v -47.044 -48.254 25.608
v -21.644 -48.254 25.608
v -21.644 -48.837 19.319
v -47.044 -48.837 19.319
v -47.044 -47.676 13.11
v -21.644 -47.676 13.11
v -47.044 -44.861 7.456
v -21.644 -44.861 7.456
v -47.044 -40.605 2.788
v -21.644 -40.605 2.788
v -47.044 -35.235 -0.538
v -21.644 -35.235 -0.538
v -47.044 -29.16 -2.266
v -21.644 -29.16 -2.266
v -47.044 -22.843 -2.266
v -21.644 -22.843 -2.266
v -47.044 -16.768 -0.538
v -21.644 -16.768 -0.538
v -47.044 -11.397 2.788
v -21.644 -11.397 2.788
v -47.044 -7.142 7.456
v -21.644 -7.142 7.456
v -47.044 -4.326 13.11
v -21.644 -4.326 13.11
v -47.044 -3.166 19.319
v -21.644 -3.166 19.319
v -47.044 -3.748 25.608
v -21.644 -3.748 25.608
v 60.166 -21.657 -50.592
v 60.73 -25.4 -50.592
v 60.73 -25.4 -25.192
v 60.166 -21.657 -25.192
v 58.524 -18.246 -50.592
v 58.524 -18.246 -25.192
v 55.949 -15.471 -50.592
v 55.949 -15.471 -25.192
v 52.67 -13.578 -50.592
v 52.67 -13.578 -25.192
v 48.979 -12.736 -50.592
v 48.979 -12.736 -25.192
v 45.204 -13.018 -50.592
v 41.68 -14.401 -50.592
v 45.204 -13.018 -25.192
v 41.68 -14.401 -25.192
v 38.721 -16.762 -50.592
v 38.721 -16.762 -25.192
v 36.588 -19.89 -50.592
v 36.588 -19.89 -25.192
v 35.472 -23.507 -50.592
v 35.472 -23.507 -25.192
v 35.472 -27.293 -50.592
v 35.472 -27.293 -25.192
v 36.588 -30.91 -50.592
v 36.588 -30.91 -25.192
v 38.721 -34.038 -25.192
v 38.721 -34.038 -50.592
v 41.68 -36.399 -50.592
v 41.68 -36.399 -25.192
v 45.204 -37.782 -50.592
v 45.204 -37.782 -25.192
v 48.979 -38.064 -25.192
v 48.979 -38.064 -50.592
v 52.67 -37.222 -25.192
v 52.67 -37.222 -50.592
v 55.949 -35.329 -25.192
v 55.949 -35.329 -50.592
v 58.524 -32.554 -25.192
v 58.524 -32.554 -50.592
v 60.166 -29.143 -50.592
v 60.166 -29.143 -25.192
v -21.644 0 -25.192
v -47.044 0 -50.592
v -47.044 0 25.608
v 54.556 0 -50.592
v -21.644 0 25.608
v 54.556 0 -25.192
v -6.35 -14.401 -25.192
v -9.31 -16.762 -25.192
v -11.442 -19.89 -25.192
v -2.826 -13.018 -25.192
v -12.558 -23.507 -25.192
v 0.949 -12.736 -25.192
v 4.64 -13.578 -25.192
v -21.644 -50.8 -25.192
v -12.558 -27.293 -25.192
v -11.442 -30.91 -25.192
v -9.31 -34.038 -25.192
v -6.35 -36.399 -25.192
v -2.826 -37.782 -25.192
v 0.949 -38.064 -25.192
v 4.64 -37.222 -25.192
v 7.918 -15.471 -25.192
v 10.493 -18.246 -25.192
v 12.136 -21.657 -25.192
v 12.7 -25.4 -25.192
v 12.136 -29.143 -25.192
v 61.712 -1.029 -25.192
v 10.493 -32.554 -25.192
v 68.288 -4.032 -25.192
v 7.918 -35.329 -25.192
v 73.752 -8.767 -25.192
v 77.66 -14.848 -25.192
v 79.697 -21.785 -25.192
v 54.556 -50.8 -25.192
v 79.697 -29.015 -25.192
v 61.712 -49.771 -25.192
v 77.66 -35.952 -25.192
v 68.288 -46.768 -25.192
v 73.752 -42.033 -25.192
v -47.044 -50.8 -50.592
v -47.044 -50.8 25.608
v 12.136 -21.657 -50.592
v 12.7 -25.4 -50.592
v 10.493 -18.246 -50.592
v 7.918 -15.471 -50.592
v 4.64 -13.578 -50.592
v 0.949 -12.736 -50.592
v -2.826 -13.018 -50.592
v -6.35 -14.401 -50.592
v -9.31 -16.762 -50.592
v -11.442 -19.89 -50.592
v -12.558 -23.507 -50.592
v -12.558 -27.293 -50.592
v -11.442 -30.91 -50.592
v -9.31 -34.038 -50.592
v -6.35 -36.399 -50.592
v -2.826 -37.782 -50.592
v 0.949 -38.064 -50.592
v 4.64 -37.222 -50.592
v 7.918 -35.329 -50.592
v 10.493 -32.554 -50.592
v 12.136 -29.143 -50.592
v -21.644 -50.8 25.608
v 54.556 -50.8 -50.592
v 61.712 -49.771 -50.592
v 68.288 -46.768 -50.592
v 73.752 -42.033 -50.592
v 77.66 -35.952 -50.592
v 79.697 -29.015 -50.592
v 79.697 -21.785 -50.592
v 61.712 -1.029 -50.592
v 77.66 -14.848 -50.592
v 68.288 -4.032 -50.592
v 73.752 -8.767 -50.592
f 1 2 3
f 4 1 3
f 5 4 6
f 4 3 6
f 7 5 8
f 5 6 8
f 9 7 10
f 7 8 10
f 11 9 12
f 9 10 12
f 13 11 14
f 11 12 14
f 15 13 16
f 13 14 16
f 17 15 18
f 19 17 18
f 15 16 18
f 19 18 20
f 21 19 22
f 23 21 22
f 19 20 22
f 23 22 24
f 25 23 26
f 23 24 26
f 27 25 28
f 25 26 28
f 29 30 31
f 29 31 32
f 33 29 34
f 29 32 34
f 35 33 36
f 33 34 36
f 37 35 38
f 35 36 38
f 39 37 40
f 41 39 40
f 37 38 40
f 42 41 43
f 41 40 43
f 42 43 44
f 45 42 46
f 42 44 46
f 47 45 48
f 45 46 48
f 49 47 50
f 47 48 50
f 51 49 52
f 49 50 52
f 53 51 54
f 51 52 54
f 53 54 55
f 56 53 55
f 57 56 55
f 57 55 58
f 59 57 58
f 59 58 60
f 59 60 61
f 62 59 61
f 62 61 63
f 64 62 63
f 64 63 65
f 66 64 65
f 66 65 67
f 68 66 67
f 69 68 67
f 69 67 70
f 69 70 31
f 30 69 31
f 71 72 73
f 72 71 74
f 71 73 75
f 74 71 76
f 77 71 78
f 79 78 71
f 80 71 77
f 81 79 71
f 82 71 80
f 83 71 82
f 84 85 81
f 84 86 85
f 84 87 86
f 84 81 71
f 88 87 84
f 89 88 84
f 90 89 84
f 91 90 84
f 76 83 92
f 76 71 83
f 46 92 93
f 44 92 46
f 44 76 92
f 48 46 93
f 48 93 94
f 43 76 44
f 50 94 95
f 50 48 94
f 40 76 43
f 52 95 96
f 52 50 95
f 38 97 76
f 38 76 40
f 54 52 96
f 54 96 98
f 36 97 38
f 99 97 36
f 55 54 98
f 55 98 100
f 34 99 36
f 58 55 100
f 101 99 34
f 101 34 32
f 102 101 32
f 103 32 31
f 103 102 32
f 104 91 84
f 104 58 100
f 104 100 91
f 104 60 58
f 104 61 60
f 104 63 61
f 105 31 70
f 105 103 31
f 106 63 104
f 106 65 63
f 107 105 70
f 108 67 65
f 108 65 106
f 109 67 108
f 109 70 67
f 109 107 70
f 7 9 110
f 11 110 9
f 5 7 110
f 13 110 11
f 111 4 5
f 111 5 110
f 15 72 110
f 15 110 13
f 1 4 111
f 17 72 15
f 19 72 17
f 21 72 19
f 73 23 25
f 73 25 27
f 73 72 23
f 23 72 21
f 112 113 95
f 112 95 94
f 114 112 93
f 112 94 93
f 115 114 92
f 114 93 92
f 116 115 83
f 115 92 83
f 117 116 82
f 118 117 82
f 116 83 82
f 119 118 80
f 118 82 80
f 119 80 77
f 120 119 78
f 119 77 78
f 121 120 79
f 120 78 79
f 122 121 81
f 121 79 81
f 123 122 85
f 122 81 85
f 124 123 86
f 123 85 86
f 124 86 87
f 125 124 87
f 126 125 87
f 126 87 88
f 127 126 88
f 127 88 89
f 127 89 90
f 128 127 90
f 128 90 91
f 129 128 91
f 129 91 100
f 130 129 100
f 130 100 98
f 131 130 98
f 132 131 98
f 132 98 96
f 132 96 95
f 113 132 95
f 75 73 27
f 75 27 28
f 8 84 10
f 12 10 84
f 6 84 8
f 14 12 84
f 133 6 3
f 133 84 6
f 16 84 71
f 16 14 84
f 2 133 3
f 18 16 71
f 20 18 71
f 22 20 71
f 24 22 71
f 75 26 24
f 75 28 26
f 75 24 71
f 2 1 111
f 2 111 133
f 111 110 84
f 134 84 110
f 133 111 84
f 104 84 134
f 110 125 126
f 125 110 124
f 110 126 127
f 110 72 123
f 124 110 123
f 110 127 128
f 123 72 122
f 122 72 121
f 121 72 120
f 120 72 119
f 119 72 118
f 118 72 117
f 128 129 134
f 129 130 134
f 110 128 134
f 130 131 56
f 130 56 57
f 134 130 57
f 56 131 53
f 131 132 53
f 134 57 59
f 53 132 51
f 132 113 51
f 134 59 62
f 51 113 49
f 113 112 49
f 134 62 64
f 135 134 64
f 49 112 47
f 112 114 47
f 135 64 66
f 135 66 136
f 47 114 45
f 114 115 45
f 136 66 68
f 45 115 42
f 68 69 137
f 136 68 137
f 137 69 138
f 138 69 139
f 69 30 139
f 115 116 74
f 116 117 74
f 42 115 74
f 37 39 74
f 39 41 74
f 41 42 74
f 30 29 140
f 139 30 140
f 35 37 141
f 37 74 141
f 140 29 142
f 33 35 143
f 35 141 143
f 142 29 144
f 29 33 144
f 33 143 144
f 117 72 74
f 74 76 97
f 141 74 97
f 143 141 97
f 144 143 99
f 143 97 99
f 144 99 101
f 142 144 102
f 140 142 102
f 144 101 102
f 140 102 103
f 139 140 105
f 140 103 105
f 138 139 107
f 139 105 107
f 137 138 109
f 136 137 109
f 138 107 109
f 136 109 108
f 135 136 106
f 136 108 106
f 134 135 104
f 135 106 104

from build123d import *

# Parameters (mm, degrees)
F0_W     = 101.6
F0_H     = 76.2
F1_DEPTH = 50.8
F2_W     = 76.2
F2_H     = 50.8
F3_DEPTH = 50.8
F4_W     = 25.4
F4_H     = 25.4
F6_R     = 12.7
F7_DEPTH = 101.6
F9_DEPTH = 101.6


with BuildPart() as f1:
    # F0 (on Front) → F1 (new body)
    with BuildSketch(Plane.XZ):
        with Locations((3.755716607, -12.4916662514)):
            Rectangle(F0_W, F0_H)
    extrude(amount=F1_DEPTH)

    # F2 (on face) → F3 (cut)
    with BuildSketch(Plane.XY.offset(25.6083337486)):
        with Locations((16.455716607, -25.4)):
            Rectangle(F2_W, F2_H)
    extrude(amount=-F3_DEPTH, mode=Mode.SUBTRACT)

    # F4 (on face) → F5 (revolve)
    with BuildSketch(Plane.YZ.offset(54.555716607)):
        with Locations((-12.7, -37.8916662514)):
            Rectangle(F4_W, F4_H)
    revolve(axis=Axis((54.555716607, -25.4, -37.8916662514), (0, 0, -1)))

    # F6 (on face) → F7 (cut)
    with BuildSketch(Plane.XY.offset(-25.1916662514)):
        with Locations((0, -25.4)):
            Circle(F6_R)
        with Locations((48.030372709, -25.4)):
            Circle(F6_R)
    extrude(amount=-F7_DEPTH, mode=Mode.SUBTRACT)

    # F8 (on face) → F9 (cut)
    with BuildSketch(Plane.YZ.offset(-21.644283393)):
        with BuildLine():
            Line((-3.748458612, 25.6083337486), (-48.2540987432, 25.6083337486))
            ThreePointArc((-48.2540987432, 25.6083337486), (-26.0012786776, -2.4853646692), (-3.748458612, 25.6083337486))
        make_face()
    extrude(amount=-F9_DEPTH, mode=Mode.SUBTRACT)


solid = f1.part
